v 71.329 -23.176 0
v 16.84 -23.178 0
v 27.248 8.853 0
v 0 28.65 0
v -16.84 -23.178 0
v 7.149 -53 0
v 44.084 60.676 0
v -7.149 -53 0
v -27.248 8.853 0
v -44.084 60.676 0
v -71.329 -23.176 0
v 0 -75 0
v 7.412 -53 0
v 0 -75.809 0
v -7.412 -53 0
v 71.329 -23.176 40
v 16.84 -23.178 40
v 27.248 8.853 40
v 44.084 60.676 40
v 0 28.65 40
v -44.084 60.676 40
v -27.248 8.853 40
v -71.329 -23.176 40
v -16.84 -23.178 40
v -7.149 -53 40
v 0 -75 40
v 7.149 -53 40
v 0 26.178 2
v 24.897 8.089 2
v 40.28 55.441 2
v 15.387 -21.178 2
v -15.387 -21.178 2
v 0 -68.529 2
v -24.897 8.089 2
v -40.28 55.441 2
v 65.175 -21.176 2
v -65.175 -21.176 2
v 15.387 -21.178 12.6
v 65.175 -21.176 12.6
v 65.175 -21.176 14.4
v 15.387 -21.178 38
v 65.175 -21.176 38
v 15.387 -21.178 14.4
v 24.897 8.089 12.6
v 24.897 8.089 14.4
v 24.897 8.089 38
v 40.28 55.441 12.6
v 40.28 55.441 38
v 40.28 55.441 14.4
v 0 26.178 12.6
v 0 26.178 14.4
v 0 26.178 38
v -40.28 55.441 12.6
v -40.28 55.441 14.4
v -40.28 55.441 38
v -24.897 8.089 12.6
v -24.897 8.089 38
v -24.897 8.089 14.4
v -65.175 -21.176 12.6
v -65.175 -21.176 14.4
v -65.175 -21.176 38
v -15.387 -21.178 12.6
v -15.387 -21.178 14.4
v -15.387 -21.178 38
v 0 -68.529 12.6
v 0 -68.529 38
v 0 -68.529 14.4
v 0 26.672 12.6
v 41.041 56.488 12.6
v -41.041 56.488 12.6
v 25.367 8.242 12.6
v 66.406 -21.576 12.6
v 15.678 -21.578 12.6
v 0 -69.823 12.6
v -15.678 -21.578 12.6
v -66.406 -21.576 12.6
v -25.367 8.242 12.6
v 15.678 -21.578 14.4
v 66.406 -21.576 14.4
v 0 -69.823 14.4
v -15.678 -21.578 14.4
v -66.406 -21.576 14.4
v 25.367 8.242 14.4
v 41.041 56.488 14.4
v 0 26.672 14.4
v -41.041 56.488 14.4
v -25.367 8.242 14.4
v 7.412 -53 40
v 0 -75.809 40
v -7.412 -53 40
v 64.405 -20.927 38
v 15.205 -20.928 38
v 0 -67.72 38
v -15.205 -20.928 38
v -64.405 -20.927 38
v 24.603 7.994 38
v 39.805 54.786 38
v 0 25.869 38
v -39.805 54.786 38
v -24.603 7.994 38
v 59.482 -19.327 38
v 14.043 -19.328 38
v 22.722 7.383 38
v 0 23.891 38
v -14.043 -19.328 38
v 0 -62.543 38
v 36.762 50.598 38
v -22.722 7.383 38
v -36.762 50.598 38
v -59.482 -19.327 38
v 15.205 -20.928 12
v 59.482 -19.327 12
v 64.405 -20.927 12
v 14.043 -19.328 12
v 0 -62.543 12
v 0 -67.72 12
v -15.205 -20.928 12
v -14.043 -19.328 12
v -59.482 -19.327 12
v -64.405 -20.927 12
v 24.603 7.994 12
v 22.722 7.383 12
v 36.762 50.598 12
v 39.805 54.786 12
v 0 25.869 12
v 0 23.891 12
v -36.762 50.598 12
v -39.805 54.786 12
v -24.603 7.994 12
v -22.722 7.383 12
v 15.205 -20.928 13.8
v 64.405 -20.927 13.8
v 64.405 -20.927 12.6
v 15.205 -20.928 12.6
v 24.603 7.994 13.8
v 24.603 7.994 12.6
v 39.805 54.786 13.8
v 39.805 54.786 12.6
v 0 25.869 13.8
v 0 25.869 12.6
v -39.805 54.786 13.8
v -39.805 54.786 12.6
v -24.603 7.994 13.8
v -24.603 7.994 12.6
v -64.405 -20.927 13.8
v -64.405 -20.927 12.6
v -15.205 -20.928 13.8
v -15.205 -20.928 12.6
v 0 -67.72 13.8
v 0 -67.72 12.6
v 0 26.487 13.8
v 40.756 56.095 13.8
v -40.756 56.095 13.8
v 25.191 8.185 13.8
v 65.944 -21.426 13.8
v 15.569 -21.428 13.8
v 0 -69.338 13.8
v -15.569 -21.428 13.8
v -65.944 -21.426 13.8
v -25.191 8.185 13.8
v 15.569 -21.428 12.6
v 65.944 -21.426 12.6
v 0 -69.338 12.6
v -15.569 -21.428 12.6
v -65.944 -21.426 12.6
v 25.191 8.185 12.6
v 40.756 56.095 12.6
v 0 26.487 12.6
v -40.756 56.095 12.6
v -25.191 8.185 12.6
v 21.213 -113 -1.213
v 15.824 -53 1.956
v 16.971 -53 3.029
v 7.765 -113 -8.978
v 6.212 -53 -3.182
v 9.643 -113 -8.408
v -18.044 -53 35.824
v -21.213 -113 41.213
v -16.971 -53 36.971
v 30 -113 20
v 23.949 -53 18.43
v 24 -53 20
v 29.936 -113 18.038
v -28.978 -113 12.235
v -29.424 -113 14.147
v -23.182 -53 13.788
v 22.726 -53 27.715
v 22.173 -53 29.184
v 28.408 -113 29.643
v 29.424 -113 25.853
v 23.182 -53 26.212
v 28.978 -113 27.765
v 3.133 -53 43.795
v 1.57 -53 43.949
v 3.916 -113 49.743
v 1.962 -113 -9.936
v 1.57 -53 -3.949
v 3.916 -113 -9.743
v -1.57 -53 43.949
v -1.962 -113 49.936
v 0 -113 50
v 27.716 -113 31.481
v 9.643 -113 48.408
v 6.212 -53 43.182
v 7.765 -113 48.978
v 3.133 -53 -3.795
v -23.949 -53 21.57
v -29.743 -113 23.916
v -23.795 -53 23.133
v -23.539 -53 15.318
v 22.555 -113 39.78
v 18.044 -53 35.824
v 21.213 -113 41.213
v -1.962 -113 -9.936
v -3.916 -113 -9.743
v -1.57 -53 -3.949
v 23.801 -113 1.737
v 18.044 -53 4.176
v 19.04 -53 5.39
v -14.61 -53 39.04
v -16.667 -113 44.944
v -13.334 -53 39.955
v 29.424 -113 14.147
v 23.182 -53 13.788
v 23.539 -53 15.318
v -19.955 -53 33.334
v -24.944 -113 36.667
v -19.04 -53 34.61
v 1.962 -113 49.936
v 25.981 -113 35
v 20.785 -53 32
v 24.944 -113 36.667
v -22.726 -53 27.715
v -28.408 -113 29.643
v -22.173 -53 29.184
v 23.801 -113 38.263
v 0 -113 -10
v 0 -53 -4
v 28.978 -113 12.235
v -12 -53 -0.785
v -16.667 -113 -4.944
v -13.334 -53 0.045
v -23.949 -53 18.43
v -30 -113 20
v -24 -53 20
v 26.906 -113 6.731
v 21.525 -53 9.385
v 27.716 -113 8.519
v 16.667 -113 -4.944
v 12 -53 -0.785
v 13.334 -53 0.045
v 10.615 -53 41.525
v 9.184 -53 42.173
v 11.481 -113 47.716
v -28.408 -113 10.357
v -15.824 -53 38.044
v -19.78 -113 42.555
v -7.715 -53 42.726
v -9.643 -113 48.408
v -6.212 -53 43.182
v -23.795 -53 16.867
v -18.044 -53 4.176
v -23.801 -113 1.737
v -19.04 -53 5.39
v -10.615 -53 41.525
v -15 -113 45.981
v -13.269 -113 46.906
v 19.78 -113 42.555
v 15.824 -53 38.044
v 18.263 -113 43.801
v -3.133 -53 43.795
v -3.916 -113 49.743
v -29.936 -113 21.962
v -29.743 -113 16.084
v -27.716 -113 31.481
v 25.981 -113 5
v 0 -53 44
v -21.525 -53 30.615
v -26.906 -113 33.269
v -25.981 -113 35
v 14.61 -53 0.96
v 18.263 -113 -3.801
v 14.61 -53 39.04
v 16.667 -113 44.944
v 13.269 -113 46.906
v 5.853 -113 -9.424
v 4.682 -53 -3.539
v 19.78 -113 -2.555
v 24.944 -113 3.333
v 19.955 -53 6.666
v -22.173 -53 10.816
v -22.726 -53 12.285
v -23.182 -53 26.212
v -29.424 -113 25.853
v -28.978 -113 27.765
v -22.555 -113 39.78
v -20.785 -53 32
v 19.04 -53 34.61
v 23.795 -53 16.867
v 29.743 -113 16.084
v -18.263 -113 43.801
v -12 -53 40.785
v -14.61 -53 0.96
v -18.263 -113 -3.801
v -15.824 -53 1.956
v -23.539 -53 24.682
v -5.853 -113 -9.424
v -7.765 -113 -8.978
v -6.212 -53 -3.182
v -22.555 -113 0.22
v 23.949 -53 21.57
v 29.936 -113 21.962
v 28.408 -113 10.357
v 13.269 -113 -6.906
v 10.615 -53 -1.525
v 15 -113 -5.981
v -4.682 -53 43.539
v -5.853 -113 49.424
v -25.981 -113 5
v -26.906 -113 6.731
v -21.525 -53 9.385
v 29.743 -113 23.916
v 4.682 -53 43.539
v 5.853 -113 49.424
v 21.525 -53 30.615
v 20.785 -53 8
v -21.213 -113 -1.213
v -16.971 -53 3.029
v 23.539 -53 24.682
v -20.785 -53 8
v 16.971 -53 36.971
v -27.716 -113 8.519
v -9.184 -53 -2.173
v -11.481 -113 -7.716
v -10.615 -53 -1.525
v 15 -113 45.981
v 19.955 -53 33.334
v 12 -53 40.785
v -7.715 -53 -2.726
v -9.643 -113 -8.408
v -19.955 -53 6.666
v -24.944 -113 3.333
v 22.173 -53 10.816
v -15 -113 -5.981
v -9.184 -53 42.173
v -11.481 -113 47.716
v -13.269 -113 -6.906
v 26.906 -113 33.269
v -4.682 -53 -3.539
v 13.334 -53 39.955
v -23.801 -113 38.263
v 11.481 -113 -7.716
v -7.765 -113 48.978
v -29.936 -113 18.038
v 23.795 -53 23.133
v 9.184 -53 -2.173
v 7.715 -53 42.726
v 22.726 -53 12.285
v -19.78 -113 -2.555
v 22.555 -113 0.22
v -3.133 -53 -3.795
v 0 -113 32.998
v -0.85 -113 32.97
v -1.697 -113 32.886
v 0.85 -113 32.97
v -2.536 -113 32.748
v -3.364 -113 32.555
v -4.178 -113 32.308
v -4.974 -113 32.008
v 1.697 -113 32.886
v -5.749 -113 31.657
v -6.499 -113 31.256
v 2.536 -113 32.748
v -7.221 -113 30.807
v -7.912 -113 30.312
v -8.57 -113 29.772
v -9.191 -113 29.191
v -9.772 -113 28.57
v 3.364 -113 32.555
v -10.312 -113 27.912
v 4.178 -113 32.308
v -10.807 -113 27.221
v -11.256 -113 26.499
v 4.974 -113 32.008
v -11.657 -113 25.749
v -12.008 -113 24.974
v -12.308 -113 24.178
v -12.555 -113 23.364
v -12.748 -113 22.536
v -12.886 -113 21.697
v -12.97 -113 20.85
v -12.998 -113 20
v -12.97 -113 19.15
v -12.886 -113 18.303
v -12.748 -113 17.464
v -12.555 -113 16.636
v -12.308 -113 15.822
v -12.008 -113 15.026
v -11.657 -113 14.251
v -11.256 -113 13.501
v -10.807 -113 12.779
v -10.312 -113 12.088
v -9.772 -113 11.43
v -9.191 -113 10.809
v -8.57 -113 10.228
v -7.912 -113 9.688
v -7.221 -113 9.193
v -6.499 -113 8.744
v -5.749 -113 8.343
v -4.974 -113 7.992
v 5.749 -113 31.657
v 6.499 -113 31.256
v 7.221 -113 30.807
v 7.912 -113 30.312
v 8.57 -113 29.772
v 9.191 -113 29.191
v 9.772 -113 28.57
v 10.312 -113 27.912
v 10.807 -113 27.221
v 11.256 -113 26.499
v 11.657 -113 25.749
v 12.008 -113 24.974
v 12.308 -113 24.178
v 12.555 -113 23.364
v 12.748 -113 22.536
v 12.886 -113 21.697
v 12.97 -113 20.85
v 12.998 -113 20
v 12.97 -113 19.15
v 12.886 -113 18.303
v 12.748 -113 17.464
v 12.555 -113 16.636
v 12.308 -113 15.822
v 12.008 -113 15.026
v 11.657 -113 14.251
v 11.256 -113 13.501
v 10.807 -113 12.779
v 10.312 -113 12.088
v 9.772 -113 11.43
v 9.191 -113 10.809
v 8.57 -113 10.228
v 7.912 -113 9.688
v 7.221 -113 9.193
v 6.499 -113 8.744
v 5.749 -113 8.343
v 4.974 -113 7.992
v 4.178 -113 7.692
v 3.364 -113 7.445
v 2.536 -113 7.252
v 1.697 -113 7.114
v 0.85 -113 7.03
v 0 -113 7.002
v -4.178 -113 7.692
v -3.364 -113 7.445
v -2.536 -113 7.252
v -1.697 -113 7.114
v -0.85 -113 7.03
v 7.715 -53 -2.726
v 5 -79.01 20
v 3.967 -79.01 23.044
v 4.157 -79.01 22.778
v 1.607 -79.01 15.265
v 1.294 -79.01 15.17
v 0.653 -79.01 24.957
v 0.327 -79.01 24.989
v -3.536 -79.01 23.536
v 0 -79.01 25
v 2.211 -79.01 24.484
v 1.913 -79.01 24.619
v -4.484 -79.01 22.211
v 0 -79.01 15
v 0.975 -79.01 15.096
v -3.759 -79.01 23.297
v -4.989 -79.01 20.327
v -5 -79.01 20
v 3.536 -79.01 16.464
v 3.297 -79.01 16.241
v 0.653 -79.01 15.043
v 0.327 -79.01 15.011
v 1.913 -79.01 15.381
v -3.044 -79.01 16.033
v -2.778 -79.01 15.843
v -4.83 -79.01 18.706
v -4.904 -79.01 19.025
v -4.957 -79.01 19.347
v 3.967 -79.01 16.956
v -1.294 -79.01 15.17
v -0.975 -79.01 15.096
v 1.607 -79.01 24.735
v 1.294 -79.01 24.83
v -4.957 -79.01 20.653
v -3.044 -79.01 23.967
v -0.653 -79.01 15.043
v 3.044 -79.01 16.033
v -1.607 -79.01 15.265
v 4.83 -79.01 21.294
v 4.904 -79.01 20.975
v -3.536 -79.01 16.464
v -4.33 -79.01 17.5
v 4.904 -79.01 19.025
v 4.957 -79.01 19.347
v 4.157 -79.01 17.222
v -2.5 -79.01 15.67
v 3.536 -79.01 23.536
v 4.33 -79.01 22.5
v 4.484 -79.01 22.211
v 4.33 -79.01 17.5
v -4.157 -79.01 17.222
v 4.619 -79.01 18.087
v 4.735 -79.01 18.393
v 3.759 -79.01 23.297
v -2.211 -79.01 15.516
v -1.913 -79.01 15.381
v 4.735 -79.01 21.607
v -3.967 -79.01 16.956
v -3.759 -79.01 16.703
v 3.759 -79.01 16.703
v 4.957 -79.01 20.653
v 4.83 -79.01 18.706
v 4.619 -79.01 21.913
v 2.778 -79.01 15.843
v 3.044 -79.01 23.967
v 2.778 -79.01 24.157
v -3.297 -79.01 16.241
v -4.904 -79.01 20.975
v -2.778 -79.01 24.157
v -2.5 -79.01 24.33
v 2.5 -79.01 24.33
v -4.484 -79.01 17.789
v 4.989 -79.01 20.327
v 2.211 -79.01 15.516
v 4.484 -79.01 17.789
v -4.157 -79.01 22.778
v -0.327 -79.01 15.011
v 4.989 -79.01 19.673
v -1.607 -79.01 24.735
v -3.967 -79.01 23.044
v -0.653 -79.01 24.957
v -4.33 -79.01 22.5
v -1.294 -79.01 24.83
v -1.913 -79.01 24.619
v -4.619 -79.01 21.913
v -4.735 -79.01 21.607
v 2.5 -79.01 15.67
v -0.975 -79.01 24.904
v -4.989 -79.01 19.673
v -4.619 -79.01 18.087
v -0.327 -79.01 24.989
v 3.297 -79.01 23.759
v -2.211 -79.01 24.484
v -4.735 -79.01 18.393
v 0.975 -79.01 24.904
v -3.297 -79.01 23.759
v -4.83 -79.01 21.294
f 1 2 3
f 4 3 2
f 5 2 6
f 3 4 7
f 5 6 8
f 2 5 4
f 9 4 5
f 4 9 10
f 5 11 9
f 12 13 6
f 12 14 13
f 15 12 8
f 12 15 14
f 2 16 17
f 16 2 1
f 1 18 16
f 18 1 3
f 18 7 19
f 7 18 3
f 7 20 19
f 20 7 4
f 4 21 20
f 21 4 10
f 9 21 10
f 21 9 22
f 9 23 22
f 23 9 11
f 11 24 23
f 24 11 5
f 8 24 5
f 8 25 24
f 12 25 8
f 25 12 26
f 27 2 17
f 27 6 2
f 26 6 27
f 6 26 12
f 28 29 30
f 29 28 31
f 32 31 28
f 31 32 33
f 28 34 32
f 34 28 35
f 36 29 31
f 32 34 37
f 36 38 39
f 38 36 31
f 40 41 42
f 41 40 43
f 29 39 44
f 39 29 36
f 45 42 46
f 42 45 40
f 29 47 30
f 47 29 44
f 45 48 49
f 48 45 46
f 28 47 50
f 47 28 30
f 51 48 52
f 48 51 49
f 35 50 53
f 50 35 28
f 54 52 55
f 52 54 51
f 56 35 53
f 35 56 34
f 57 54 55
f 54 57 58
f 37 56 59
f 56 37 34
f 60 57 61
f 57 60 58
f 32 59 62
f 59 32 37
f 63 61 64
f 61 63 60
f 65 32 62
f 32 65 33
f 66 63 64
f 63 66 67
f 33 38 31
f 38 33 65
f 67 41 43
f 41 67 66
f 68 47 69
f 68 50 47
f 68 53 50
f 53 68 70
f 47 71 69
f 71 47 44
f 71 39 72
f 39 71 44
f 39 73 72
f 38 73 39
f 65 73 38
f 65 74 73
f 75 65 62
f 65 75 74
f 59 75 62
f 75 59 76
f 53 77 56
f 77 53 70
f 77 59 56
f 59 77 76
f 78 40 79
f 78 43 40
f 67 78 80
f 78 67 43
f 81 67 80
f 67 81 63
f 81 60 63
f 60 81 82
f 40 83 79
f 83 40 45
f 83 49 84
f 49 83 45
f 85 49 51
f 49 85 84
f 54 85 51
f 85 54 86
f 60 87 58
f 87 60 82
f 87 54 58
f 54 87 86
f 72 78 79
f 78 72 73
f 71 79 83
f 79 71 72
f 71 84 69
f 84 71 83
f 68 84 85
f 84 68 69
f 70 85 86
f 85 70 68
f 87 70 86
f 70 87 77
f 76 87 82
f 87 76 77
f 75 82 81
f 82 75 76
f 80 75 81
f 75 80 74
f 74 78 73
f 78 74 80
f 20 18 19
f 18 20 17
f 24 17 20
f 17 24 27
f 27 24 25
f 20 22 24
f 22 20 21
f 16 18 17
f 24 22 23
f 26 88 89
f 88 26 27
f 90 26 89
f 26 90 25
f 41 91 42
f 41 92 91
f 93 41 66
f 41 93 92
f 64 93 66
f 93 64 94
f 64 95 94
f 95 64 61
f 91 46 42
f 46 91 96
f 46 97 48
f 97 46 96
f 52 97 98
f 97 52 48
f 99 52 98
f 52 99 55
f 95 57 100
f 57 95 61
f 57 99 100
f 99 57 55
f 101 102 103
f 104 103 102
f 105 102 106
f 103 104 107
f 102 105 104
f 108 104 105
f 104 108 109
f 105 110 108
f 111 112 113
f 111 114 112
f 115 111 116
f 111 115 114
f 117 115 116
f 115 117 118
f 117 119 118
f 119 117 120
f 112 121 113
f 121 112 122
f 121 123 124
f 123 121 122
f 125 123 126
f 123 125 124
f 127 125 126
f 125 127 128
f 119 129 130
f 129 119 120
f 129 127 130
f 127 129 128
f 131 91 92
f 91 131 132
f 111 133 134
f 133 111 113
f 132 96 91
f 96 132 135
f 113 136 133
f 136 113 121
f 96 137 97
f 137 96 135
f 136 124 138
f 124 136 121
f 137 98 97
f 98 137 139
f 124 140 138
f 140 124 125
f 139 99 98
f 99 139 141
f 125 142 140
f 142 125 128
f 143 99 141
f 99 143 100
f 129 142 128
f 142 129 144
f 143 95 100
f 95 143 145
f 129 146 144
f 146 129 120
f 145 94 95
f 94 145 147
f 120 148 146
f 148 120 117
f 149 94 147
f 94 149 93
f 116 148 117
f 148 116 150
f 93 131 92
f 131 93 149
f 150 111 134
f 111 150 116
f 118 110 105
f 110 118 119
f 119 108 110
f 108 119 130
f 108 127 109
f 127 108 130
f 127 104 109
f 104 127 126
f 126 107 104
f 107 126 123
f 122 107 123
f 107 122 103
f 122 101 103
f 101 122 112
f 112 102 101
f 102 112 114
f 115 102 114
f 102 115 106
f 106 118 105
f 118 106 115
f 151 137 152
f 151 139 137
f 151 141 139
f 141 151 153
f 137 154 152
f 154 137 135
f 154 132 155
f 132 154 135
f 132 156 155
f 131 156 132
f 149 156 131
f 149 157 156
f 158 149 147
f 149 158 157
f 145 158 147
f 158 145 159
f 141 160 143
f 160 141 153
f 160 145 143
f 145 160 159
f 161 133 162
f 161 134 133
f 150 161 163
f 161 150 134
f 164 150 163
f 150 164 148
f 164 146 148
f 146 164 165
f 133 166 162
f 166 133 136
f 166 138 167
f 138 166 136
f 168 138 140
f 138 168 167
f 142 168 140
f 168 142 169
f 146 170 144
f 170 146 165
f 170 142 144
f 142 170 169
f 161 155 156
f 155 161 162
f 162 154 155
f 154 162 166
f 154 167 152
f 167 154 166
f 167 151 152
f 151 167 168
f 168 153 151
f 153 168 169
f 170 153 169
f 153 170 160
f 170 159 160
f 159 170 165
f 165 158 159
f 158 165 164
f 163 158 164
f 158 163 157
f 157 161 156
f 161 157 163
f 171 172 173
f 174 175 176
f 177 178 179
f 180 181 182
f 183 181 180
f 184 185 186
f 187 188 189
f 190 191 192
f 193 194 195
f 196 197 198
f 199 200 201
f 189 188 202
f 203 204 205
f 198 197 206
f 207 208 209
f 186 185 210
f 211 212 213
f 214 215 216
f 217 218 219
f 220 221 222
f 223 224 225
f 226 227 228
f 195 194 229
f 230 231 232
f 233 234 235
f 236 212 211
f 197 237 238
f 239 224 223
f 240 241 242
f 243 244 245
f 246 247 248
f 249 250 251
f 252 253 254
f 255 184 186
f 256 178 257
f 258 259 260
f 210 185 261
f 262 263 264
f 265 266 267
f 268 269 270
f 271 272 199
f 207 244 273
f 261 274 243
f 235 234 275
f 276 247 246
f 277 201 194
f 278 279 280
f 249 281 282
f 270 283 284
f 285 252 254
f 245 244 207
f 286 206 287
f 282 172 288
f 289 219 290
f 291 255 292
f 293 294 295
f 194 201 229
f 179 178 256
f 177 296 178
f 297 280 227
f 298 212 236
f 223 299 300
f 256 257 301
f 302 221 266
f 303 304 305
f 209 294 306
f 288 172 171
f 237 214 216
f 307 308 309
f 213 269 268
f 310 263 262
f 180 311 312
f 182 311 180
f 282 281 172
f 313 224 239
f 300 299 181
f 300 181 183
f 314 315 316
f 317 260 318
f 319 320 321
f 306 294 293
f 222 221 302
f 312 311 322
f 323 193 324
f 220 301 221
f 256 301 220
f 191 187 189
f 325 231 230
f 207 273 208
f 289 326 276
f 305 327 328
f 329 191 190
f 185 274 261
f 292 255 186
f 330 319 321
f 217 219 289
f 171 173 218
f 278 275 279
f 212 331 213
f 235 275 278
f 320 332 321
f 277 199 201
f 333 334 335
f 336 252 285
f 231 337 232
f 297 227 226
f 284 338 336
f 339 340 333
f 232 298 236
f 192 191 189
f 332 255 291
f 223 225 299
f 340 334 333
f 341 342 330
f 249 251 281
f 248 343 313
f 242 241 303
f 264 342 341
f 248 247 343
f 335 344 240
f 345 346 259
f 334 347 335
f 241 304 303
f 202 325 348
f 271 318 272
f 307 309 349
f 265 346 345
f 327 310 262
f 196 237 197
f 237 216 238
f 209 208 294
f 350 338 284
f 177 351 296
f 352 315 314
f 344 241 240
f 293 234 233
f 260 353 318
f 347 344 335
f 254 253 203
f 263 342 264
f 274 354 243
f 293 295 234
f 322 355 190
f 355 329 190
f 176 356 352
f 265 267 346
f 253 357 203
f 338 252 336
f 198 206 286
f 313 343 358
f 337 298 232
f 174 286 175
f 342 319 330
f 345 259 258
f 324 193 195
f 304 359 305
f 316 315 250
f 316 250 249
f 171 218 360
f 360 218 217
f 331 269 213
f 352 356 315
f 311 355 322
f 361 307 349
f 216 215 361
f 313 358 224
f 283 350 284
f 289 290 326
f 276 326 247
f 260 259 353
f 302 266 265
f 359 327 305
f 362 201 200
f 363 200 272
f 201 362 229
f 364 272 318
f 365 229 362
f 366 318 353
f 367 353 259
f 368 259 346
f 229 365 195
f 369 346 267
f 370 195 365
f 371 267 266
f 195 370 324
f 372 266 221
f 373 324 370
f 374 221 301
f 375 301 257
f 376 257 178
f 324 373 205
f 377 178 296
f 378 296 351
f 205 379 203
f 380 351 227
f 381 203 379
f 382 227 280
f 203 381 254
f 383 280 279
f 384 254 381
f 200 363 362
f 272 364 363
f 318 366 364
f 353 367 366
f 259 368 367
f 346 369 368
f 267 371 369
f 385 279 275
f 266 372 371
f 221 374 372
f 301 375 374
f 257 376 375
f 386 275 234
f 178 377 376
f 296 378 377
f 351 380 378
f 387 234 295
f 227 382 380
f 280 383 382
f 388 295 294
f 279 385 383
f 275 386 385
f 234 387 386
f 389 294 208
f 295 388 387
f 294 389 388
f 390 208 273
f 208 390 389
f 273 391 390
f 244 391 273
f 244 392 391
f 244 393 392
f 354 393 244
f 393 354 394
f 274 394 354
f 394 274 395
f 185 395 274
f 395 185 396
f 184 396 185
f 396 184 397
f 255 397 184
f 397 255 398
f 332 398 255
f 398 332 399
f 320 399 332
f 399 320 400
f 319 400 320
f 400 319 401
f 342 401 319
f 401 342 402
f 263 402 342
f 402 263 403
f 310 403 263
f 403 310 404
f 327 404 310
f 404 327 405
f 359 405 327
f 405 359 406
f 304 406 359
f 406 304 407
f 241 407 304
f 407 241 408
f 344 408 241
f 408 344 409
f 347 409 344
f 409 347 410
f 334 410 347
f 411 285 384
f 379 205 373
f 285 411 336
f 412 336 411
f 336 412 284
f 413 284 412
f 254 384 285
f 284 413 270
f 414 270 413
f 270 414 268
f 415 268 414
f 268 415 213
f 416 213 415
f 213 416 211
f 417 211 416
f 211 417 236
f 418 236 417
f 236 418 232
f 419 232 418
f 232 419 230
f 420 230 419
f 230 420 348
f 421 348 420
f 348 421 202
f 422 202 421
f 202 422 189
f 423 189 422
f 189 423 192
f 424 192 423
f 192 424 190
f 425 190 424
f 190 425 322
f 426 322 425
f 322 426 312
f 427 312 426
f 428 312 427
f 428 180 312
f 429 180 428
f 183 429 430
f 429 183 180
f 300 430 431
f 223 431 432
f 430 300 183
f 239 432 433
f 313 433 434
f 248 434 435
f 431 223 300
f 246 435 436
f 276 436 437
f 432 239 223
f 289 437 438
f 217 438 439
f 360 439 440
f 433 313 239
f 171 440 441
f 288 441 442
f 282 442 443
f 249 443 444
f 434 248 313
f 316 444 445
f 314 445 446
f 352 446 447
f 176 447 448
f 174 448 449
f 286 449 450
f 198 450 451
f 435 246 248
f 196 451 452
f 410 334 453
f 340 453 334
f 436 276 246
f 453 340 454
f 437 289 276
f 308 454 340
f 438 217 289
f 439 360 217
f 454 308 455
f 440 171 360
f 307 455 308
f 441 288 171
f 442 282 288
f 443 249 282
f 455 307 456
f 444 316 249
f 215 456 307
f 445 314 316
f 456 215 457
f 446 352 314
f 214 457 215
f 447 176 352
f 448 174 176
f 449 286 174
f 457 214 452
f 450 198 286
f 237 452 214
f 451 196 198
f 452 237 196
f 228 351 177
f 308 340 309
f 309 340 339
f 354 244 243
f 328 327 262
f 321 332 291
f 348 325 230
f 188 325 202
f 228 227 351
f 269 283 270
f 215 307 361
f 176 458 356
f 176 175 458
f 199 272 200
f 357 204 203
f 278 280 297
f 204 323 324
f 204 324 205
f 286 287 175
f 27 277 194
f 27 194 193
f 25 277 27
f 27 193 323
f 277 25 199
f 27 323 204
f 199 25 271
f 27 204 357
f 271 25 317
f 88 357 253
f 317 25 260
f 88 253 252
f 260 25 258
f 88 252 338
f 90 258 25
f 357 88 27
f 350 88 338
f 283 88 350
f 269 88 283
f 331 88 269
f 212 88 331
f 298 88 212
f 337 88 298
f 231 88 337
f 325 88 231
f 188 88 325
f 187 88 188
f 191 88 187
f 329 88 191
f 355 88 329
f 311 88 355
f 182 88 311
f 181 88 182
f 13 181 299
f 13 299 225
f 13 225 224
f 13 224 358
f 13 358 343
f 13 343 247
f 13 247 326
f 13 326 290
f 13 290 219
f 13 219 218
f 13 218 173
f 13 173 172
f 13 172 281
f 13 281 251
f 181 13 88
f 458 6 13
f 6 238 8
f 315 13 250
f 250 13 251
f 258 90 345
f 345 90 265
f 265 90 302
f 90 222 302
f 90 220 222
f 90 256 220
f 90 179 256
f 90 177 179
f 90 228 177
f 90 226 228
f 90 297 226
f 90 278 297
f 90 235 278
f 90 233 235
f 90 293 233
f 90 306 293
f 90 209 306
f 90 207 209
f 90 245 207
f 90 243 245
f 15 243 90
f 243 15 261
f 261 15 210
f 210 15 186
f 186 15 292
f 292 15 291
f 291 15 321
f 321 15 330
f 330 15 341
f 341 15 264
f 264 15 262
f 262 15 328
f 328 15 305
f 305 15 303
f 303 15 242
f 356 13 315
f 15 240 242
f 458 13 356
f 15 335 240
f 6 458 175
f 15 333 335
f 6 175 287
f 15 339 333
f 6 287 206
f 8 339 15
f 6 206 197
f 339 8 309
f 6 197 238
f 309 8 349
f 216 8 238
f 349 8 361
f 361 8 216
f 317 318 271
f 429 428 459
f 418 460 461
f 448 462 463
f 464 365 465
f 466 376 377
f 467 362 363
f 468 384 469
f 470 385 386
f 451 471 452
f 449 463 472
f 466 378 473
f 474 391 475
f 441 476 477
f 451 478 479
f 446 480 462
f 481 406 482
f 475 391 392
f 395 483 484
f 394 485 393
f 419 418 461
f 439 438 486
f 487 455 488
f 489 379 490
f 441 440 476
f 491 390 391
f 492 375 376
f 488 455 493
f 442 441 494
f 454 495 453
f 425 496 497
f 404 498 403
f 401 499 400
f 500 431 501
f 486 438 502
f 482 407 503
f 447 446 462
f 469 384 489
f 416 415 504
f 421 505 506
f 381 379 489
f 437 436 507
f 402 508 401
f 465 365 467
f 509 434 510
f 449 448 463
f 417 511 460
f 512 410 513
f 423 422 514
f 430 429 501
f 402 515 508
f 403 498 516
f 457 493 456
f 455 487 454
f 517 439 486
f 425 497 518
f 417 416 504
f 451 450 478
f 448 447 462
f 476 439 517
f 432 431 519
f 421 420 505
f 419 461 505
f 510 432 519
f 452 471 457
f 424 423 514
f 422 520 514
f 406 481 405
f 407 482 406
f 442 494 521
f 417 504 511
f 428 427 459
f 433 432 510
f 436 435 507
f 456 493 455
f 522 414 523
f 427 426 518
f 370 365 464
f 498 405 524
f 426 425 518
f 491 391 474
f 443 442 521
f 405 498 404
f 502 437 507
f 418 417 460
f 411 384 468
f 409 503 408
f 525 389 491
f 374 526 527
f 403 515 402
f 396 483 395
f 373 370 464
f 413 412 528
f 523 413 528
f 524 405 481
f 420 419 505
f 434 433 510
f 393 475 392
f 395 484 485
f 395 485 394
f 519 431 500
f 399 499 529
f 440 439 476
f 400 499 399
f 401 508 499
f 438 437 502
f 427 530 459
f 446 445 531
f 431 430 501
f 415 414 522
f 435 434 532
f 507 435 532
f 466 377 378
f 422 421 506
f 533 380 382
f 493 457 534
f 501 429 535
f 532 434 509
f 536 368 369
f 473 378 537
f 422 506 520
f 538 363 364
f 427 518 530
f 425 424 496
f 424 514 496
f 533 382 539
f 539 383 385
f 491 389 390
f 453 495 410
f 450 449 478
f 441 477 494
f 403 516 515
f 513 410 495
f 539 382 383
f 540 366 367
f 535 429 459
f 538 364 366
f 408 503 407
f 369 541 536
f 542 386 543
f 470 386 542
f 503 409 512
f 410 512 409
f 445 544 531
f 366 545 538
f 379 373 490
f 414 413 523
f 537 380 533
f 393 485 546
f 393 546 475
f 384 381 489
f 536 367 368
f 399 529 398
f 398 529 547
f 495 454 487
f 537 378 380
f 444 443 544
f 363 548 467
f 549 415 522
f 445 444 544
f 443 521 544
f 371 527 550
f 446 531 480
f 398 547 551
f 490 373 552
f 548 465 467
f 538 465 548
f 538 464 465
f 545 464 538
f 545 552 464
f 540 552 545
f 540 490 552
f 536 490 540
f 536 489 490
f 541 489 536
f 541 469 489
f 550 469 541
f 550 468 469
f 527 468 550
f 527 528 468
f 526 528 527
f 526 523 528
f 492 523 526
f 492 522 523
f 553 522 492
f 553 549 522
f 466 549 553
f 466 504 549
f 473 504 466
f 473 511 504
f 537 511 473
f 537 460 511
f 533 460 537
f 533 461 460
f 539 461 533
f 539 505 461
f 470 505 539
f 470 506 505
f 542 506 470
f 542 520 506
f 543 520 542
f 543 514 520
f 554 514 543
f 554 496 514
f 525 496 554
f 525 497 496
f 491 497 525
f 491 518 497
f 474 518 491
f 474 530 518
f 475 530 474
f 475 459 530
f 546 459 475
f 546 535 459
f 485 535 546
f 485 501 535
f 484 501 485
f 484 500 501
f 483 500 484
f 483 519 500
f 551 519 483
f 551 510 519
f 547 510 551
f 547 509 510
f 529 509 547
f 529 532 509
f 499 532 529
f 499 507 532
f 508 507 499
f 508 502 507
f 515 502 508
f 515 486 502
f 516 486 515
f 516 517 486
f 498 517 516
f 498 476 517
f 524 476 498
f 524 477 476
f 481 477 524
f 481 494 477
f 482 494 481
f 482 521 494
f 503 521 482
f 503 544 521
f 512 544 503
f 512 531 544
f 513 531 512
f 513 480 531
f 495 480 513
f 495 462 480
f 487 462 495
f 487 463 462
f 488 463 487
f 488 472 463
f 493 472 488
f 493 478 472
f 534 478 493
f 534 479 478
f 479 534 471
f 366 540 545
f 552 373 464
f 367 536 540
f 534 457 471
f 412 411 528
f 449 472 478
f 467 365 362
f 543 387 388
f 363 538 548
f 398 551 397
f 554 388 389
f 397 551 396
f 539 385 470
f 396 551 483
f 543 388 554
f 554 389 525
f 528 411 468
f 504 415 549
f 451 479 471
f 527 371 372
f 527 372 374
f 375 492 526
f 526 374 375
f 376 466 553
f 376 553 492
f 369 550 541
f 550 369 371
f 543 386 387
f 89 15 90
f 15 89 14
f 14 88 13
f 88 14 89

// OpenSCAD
// Christmas Star Tree-Topper Box
// Three printable parts:
//   part = "front"    -> front half-shell (star shaped, prints face down)
//   part = "back"     -> back half-shell with snap lip (prints face down)
//   part = "base"     -> conic base that slides over the tree tip and
//                        locks the two halves at the bottom star point
//   part = "assembly" -> preview of all parts assembled
//
// Render STLs with:
//   openscad -o front.stl -D part=\"front\" star_box.scad
//
// All dimensions in millimeters.

part = "assembly";

/* ---------- Star parameters ---------- */
star_points   = 5;
R             = 75;            // outer radius (tip to center) -> 150 mm tip-to-tip
r             = R * 0.382;     // inner radius of the pentagram
thickness     = 40;            // total box depth (front + back)
wall          = 2;             // wall / face thickness
clearance     = 0.25;          // printing clearance for fits

/* ---------- Snap-fit parameters ---------- */
lip_h         = 8;             // how far the back lip slides into the front
lip_w         = 1.6;           // lip wall width
bump          = 0.5;           // snap ridge interference
ridge_h       = 1.2;           // snap ridge band height
groove_h      = 1.8;           // groove band height (slightly taller)

/* ---------- Conic base parameters ---------- */
cone_h        = 60;            // cone height
cone_r_bottom = 30;            // outer radius at the wide (bottom) end
cone_r_top    = 24;            // outer radius at the top end
cone_wall     = 3;             // minimum cone wall
socket_depth  = 22;            // how deep the star bottom tip sinks into the cone
tree_hole_r   = 13;            // tree tip hole radius at the bottom
tree_hole_top = 5;             // tree tip hole radius at the top of the hole
tree_hole_h   = 34;            // tree tip hole depth (from the bottom)

$fn = 96;
half = thickness / 2;

/* ---------- 2D star ---------- */
module star2d() {
    // one point straight down (-Y), so the bottom tip meets the cone
    polygon([for (i = [0 : 2 * star_points - 1])
        let (a = -90 + i * 180 / star_points,
             rad = (i % 2 == 0) ? R : r)
        [rad * cos(a), rad * sin(a)]]);
}

module star_offset(d) { offset(delta = d) star2d(); }

/* ---------- Front half-shell ----------
   Prints as modeled: outer face on the bed (z = 0), cavity opening up. */
module front() {
    difference() {
        linear_extrude(half) star2d();
        // cavity
        translate([0, 0, wall])
            linear_extrude(half) star_offset(-wall);
        // snap groove in the inner wall, where the back lip's ridge lands
        translate([0, 0, half - lip_h + 0.6])
            linear_extrude(groove_h) difference() {
                star_offset(-wall + bump - 0.1);
                star_offset(-wall - clearance);
            }
    }
}

/* ---------- Back half-shell ----------
   Same shell as the front plus an inner lip with a snap ridge. */
module back() {
    // shell
    difference() {
        linear_extrude(half) star2d();
        translate([0, 0, wall])
            linear_extrude(half) star_offset(-wall);
    }
    // lip that slides inside the front cavity, rising from the floor
    translate([0, 0, wall])
        linear_extrude(half - wall + lip_h) difference() {
            star_offset(-wall - clearance);
            star_offset(-wall - clearance - lip_w);
        }
    // snap ridge near the lip tip
    translate([0, 0, half + lip_h - 0.6 - ridge_h])
        linear_extrude(ridge_h) difference() {
            star_offset(-wall - clearance + bump);
            star_offset(-wall - clearance - lip_w);
        }
}

/* ---------- Assembled star box (for the cone socket) ---------- */
module star_solid(extra = 0) {
    // full closed box outline, slightly enlarged by `extra` for clearance
    linear_extrude(thickness) star_offset(extra);
}

/* ---------- Conic base ----------
   Modeled in its printing orientation: wide end on the bed, axis = Z.
   In use it is flipped is not needed: tree tip enters from the bottom,
   the star's bottom point snaps into the socket cut in the top. */
module base() {
    difference() {
        cylinder(h = cone_h, r1 = cone_r_bottom, r2 = cone_r_top);
        // tree tip hole from the bottom
        translate([0, 0, -0.01])
            cylinder(h = tree_hole_h, r1 = tree_hole_r, r2 = tree_hole_top);
        // star-tip socket cut into the top: the star (with clearance)
        // positioned tip-down, sunk socket_depth into the cone
        translate([0, 0, cone_h - socket_depth + R])
            rotate([90, 0, 0])
                translate([0, 0, -thickness / 2])
                    star_solid(clearance);
    }
}

/* ---------- Assembly preview ---------- */
module assembly() {
    color("firebrick") front();
    color("darkred") translate([0, 0, thickness]) mirror([0, 0, 1]) back();
    color("goldenrod")
        translate([0, -R + socket_depth - cone_h, thickness / 2])
            rotate([-90, 0, 0]) base();
}

if (part == "front")    front();
if (part == "back")     back();
if (part == "base")     base();
if (part == "assembly") assembly();
